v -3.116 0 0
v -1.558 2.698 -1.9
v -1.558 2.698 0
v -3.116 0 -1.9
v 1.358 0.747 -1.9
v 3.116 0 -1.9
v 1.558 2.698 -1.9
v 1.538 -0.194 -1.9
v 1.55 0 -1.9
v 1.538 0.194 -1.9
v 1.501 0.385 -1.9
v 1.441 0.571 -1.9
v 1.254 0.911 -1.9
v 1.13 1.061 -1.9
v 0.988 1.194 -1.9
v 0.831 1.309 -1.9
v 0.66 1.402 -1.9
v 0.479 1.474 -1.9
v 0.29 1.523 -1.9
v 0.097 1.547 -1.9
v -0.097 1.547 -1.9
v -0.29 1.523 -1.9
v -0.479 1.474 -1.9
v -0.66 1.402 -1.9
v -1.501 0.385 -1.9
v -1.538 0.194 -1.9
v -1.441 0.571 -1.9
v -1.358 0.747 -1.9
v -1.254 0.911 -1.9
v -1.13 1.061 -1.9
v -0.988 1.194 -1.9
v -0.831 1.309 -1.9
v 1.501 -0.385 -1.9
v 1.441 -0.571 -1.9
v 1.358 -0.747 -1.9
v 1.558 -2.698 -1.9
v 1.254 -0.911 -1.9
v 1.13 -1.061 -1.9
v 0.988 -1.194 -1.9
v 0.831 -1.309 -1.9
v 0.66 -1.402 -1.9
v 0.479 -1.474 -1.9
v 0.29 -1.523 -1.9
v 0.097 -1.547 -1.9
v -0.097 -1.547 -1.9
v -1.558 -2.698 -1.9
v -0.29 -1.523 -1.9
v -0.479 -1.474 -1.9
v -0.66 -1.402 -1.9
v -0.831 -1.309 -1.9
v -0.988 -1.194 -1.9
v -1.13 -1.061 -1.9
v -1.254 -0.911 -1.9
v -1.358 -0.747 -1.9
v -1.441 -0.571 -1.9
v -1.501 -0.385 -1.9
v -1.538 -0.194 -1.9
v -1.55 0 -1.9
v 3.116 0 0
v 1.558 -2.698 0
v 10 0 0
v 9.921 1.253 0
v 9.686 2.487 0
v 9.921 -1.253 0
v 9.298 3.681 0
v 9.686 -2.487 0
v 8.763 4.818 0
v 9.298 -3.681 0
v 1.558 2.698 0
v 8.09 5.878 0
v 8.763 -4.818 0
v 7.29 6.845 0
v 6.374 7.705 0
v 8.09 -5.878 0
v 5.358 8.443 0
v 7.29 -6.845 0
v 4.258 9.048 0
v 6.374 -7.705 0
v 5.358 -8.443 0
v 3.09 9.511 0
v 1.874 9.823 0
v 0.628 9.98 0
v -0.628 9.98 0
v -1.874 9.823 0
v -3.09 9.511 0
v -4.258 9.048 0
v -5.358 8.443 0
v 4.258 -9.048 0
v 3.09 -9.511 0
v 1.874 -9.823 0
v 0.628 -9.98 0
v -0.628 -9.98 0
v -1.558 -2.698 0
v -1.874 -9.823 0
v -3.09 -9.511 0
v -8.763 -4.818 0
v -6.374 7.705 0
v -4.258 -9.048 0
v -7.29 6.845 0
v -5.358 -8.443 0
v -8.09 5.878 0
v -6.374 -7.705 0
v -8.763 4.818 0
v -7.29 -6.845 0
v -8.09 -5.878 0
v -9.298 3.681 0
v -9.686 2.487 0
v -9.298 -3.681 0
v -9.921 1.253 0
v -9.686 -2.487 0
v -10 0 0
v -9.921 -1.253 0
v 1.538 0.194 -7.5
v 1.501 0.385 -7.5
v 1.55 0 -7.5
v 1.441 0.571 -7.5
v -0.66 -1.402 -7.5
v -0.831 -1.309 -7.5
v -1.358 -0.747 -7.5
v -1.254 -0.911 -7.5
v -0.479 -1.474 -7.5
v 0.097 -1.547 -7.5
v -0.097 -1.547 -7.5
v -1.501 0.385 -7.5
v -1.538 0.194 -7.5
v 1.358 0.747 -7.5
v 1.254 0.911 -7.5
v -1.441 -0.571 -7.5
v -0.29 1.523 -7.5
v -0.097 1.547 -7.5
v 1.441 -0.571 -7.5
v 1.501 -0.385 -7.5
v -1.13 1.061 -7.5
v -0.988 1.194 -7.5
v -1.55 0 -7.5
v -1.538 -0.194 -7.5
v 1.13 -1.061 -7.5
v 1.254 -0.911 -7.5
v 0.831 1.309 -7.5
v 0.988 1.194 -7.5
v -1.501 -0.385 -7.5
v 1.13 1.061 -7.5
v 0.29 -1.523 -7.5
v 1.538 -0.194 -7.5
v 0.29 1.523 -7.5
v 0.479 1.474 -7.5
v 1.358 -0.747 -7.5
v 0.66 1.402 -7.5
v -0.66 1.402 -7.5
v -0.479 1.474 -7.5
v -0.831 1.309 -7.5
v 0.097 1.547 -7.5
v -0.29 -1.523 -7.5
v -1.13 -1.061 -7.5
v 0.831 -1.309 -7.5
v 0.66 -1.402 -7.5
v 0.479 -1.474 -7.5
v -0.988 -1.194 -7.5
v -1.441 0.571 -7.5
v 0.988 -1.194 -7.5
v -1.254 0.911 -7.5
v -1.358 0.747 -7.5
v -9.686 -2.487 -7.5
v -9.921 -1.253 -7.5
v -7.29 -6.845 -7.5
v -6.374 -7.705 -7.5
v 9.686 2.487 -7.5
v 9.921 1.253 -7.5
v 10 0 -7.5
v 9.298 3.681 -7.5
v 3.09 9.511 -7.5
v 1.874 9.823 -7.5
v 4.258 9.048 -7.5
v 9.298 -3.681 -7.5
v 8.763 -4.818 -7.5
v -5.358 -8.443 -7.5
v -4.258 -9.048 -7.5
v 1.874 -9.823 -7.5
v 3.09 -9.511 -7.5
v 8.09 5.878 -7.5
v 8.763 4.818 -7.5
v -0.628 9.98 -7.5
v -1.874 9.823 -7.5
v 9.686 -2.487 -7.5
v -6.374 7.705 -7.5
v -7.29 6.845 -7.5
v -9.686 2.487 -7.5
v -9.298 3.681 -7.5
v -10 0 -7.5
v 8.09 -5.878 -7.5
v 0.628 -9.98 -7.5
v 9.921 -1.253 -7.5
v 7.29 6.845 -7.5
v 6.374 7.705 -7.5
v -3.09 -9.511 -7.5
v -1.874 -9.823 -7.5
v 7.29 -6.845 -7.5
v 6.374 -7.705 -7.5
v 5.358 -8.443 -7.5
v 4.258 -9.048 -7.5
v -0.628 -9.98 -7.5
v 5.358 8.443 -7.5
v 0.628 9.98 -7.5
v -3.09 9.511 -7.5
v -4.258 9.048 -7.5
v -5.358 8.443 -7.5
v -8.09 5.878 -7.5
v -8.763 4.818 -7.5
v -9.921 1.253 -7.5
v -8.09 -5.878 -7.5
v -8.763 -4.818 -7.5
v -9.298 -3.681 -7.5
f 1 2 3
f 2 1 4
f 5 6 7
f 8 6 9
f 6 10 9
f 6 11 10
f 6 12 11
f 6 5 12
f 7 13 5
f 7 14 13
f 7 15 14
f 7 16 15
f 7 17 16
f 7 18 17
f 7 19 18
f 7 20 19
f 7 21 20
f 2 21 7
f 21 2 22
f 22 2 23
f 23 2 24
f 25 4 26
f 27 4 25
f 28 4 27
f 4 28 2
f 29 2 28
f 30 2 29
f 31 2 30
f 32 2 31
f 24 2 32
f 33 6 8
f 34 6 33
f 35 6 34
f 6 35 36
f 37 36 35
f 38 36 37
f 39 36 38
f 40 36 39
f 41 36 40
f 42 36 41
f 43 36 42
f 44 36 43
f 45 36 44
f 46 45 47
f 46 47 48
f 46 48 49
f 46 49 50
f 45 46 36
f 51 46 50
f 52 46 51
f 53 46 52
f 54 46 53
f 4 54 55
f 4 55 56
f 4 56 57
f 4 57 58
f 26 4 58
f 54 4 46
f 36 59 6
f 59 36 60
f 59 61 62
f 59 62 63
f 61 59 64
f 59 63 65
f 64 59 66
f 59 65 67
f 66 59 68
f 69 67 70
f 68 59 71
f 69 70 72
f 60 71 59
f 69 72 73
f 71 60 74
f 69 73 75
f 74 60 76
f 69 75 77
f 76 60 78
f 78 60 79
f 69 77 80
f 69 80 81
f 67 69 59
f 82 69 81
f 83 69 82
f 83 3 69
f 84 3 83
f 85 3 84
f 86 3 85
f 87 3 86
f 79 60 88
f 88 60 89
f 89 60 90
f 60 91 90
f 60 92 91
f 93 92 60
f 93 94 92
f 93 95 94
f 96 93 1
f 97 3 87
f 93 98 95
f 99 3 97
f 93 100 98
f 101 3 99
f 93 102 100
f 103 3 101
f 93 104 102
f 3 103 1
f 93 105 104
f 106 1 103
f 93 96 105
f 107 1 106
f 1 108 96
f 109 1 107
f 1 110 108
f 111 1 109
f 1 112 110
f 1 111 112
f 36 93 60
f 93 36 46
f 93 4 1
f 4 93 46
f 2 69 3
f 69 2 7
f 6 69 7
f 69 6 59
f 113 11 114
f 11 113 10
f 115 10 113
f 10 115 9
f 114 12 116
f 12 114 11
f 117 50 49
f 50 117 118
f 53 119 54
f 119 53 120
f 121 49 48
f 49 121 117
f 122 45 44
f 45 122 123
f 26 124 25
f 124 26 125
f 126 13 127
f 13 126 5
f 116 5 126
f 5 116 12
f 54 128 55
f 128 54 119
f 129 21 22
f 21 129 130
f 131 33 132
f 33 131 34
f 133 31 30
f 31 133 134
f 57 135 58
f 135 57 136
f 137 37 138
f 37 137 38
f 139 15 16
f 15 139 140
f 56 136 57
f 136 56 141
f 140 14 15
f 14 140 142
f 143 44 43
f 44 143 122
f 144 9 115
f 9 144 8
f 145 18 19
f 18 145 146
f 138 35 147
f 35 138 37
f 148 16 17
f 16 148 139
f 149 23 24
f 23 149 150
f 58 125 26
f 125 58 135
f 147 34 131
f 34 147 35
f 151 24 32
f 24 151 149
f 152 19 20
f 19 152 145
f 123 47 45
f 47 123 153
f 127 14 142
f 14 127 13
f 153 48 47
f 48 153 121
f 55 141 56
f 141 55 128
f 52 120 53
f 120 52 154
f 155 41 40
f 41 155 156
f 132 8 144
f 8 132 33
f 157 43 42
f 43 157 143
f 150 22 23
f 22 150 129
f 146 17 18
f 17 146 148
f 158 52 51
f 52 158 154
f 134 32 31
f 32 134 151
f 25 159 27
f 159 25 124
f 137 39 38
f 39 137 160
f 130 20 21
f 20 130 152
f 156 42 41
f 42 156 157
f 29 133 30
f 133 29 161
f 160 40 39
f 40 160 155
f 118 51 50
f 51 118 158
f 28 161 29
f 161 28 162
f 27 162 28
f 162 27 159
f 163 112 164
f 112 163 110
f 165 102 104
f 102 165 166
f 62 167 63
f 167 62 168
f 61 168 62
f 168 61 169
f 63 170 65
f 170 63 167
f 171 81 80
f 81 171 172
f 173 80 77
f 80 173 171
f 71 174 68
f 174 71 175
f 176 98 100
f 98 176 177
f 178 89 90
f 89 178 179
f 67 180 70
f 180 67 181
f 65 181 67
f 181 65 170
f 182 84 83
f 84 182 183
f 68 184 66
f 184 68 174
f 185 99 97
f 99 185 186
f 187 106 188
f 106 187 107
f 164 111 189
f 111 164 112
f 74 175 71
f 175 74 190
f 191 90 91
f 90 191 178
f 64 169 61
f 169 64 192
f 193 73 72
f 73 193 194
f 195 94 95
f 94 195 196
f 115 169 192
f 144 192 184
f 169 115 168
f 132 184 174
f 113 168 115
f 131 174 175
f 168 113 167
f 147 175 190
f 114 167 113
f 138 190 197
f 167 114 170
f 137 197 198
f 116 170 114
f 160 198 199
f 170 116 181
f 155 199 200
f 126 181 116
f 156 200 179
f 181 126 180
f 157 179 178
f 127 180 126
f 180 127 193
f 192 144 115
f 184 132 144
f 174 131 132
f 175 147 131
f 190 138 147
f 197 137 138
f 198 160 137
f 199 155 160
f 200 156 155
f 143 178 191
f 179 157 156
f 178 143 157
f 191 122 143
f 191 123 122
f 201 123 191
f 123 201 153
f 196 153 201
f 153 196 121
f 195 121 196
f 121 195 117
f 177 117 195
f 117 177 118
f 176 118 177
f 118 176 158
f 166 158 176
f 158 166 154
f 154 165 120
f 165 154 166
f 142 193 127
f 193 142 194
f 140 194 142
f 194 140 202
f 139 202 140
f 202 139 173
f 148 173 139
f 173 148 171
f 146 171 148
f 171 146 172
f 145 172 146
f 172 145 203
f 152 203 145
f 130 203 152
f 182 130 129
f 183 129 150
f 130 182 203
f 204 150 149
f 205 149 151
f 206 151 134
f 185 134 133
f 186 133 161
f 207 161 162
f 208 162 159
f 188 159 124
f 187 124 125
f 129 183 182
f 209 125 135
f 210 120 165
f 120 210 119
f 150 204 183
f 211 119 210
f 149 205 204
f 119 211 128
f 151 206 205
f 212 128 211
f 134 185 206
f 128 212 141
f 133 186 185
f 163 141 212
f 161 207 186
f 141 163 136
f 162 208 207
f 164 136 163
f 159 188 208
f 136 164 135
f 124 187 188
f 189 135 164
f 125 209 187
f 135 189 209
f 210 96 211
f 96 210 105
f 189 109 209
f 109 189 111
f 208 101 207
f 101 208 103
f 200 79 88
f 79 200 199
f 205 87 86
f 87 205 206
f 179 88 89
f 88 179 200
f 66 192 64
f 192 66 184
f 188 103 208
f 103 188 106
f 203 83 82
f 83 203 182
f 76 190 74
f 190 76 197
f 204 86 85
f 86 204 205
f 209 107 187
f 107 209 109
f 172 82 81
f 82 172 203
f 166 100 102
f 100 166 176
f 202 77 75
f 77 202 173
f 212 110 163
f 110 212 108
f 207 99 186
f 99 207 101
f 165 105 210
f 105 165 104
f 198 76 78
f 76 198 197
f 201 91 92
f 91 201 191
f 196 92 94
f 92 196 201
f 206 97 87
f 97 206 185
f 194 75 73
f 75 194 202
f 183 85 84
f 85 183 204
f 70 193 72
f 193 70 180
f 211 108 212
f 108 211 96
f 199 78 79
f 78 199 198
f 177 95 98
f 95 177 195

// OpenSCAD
$fn = 50;


difference() {
	union() {
		translate(v = [0, 0, -7.5000000000]) {
			cylinder(h = 7.5000000000, r = 10.0000000000);
		}
	}
	union() {
		translate(v = [0, 0, 0]) {
			rotate(a = [0, 0, 0]) {
				difference() {
					union() {
						translate(v = [0, 0, -1.9000000000]) {
							linear_extrude(height = 1.9000000000) {
								polygon(points = [[3.1158000000, 0.0000000000], [1.5579000000, 2.6983619531], [-1.5579000000, 2.6983619531], [-3.1158000000, 0.0000000000], [-1.5579000000, -2.6983619531], [1.5579000000, -2.6983619531]]);
							}
						}
					}
					union();
				}
			}
		}
		#translate(v = [0, 0, -100.0000000000]) {
			cylinder(h = 200, r = 1.5500000000);
		}
	}
}
